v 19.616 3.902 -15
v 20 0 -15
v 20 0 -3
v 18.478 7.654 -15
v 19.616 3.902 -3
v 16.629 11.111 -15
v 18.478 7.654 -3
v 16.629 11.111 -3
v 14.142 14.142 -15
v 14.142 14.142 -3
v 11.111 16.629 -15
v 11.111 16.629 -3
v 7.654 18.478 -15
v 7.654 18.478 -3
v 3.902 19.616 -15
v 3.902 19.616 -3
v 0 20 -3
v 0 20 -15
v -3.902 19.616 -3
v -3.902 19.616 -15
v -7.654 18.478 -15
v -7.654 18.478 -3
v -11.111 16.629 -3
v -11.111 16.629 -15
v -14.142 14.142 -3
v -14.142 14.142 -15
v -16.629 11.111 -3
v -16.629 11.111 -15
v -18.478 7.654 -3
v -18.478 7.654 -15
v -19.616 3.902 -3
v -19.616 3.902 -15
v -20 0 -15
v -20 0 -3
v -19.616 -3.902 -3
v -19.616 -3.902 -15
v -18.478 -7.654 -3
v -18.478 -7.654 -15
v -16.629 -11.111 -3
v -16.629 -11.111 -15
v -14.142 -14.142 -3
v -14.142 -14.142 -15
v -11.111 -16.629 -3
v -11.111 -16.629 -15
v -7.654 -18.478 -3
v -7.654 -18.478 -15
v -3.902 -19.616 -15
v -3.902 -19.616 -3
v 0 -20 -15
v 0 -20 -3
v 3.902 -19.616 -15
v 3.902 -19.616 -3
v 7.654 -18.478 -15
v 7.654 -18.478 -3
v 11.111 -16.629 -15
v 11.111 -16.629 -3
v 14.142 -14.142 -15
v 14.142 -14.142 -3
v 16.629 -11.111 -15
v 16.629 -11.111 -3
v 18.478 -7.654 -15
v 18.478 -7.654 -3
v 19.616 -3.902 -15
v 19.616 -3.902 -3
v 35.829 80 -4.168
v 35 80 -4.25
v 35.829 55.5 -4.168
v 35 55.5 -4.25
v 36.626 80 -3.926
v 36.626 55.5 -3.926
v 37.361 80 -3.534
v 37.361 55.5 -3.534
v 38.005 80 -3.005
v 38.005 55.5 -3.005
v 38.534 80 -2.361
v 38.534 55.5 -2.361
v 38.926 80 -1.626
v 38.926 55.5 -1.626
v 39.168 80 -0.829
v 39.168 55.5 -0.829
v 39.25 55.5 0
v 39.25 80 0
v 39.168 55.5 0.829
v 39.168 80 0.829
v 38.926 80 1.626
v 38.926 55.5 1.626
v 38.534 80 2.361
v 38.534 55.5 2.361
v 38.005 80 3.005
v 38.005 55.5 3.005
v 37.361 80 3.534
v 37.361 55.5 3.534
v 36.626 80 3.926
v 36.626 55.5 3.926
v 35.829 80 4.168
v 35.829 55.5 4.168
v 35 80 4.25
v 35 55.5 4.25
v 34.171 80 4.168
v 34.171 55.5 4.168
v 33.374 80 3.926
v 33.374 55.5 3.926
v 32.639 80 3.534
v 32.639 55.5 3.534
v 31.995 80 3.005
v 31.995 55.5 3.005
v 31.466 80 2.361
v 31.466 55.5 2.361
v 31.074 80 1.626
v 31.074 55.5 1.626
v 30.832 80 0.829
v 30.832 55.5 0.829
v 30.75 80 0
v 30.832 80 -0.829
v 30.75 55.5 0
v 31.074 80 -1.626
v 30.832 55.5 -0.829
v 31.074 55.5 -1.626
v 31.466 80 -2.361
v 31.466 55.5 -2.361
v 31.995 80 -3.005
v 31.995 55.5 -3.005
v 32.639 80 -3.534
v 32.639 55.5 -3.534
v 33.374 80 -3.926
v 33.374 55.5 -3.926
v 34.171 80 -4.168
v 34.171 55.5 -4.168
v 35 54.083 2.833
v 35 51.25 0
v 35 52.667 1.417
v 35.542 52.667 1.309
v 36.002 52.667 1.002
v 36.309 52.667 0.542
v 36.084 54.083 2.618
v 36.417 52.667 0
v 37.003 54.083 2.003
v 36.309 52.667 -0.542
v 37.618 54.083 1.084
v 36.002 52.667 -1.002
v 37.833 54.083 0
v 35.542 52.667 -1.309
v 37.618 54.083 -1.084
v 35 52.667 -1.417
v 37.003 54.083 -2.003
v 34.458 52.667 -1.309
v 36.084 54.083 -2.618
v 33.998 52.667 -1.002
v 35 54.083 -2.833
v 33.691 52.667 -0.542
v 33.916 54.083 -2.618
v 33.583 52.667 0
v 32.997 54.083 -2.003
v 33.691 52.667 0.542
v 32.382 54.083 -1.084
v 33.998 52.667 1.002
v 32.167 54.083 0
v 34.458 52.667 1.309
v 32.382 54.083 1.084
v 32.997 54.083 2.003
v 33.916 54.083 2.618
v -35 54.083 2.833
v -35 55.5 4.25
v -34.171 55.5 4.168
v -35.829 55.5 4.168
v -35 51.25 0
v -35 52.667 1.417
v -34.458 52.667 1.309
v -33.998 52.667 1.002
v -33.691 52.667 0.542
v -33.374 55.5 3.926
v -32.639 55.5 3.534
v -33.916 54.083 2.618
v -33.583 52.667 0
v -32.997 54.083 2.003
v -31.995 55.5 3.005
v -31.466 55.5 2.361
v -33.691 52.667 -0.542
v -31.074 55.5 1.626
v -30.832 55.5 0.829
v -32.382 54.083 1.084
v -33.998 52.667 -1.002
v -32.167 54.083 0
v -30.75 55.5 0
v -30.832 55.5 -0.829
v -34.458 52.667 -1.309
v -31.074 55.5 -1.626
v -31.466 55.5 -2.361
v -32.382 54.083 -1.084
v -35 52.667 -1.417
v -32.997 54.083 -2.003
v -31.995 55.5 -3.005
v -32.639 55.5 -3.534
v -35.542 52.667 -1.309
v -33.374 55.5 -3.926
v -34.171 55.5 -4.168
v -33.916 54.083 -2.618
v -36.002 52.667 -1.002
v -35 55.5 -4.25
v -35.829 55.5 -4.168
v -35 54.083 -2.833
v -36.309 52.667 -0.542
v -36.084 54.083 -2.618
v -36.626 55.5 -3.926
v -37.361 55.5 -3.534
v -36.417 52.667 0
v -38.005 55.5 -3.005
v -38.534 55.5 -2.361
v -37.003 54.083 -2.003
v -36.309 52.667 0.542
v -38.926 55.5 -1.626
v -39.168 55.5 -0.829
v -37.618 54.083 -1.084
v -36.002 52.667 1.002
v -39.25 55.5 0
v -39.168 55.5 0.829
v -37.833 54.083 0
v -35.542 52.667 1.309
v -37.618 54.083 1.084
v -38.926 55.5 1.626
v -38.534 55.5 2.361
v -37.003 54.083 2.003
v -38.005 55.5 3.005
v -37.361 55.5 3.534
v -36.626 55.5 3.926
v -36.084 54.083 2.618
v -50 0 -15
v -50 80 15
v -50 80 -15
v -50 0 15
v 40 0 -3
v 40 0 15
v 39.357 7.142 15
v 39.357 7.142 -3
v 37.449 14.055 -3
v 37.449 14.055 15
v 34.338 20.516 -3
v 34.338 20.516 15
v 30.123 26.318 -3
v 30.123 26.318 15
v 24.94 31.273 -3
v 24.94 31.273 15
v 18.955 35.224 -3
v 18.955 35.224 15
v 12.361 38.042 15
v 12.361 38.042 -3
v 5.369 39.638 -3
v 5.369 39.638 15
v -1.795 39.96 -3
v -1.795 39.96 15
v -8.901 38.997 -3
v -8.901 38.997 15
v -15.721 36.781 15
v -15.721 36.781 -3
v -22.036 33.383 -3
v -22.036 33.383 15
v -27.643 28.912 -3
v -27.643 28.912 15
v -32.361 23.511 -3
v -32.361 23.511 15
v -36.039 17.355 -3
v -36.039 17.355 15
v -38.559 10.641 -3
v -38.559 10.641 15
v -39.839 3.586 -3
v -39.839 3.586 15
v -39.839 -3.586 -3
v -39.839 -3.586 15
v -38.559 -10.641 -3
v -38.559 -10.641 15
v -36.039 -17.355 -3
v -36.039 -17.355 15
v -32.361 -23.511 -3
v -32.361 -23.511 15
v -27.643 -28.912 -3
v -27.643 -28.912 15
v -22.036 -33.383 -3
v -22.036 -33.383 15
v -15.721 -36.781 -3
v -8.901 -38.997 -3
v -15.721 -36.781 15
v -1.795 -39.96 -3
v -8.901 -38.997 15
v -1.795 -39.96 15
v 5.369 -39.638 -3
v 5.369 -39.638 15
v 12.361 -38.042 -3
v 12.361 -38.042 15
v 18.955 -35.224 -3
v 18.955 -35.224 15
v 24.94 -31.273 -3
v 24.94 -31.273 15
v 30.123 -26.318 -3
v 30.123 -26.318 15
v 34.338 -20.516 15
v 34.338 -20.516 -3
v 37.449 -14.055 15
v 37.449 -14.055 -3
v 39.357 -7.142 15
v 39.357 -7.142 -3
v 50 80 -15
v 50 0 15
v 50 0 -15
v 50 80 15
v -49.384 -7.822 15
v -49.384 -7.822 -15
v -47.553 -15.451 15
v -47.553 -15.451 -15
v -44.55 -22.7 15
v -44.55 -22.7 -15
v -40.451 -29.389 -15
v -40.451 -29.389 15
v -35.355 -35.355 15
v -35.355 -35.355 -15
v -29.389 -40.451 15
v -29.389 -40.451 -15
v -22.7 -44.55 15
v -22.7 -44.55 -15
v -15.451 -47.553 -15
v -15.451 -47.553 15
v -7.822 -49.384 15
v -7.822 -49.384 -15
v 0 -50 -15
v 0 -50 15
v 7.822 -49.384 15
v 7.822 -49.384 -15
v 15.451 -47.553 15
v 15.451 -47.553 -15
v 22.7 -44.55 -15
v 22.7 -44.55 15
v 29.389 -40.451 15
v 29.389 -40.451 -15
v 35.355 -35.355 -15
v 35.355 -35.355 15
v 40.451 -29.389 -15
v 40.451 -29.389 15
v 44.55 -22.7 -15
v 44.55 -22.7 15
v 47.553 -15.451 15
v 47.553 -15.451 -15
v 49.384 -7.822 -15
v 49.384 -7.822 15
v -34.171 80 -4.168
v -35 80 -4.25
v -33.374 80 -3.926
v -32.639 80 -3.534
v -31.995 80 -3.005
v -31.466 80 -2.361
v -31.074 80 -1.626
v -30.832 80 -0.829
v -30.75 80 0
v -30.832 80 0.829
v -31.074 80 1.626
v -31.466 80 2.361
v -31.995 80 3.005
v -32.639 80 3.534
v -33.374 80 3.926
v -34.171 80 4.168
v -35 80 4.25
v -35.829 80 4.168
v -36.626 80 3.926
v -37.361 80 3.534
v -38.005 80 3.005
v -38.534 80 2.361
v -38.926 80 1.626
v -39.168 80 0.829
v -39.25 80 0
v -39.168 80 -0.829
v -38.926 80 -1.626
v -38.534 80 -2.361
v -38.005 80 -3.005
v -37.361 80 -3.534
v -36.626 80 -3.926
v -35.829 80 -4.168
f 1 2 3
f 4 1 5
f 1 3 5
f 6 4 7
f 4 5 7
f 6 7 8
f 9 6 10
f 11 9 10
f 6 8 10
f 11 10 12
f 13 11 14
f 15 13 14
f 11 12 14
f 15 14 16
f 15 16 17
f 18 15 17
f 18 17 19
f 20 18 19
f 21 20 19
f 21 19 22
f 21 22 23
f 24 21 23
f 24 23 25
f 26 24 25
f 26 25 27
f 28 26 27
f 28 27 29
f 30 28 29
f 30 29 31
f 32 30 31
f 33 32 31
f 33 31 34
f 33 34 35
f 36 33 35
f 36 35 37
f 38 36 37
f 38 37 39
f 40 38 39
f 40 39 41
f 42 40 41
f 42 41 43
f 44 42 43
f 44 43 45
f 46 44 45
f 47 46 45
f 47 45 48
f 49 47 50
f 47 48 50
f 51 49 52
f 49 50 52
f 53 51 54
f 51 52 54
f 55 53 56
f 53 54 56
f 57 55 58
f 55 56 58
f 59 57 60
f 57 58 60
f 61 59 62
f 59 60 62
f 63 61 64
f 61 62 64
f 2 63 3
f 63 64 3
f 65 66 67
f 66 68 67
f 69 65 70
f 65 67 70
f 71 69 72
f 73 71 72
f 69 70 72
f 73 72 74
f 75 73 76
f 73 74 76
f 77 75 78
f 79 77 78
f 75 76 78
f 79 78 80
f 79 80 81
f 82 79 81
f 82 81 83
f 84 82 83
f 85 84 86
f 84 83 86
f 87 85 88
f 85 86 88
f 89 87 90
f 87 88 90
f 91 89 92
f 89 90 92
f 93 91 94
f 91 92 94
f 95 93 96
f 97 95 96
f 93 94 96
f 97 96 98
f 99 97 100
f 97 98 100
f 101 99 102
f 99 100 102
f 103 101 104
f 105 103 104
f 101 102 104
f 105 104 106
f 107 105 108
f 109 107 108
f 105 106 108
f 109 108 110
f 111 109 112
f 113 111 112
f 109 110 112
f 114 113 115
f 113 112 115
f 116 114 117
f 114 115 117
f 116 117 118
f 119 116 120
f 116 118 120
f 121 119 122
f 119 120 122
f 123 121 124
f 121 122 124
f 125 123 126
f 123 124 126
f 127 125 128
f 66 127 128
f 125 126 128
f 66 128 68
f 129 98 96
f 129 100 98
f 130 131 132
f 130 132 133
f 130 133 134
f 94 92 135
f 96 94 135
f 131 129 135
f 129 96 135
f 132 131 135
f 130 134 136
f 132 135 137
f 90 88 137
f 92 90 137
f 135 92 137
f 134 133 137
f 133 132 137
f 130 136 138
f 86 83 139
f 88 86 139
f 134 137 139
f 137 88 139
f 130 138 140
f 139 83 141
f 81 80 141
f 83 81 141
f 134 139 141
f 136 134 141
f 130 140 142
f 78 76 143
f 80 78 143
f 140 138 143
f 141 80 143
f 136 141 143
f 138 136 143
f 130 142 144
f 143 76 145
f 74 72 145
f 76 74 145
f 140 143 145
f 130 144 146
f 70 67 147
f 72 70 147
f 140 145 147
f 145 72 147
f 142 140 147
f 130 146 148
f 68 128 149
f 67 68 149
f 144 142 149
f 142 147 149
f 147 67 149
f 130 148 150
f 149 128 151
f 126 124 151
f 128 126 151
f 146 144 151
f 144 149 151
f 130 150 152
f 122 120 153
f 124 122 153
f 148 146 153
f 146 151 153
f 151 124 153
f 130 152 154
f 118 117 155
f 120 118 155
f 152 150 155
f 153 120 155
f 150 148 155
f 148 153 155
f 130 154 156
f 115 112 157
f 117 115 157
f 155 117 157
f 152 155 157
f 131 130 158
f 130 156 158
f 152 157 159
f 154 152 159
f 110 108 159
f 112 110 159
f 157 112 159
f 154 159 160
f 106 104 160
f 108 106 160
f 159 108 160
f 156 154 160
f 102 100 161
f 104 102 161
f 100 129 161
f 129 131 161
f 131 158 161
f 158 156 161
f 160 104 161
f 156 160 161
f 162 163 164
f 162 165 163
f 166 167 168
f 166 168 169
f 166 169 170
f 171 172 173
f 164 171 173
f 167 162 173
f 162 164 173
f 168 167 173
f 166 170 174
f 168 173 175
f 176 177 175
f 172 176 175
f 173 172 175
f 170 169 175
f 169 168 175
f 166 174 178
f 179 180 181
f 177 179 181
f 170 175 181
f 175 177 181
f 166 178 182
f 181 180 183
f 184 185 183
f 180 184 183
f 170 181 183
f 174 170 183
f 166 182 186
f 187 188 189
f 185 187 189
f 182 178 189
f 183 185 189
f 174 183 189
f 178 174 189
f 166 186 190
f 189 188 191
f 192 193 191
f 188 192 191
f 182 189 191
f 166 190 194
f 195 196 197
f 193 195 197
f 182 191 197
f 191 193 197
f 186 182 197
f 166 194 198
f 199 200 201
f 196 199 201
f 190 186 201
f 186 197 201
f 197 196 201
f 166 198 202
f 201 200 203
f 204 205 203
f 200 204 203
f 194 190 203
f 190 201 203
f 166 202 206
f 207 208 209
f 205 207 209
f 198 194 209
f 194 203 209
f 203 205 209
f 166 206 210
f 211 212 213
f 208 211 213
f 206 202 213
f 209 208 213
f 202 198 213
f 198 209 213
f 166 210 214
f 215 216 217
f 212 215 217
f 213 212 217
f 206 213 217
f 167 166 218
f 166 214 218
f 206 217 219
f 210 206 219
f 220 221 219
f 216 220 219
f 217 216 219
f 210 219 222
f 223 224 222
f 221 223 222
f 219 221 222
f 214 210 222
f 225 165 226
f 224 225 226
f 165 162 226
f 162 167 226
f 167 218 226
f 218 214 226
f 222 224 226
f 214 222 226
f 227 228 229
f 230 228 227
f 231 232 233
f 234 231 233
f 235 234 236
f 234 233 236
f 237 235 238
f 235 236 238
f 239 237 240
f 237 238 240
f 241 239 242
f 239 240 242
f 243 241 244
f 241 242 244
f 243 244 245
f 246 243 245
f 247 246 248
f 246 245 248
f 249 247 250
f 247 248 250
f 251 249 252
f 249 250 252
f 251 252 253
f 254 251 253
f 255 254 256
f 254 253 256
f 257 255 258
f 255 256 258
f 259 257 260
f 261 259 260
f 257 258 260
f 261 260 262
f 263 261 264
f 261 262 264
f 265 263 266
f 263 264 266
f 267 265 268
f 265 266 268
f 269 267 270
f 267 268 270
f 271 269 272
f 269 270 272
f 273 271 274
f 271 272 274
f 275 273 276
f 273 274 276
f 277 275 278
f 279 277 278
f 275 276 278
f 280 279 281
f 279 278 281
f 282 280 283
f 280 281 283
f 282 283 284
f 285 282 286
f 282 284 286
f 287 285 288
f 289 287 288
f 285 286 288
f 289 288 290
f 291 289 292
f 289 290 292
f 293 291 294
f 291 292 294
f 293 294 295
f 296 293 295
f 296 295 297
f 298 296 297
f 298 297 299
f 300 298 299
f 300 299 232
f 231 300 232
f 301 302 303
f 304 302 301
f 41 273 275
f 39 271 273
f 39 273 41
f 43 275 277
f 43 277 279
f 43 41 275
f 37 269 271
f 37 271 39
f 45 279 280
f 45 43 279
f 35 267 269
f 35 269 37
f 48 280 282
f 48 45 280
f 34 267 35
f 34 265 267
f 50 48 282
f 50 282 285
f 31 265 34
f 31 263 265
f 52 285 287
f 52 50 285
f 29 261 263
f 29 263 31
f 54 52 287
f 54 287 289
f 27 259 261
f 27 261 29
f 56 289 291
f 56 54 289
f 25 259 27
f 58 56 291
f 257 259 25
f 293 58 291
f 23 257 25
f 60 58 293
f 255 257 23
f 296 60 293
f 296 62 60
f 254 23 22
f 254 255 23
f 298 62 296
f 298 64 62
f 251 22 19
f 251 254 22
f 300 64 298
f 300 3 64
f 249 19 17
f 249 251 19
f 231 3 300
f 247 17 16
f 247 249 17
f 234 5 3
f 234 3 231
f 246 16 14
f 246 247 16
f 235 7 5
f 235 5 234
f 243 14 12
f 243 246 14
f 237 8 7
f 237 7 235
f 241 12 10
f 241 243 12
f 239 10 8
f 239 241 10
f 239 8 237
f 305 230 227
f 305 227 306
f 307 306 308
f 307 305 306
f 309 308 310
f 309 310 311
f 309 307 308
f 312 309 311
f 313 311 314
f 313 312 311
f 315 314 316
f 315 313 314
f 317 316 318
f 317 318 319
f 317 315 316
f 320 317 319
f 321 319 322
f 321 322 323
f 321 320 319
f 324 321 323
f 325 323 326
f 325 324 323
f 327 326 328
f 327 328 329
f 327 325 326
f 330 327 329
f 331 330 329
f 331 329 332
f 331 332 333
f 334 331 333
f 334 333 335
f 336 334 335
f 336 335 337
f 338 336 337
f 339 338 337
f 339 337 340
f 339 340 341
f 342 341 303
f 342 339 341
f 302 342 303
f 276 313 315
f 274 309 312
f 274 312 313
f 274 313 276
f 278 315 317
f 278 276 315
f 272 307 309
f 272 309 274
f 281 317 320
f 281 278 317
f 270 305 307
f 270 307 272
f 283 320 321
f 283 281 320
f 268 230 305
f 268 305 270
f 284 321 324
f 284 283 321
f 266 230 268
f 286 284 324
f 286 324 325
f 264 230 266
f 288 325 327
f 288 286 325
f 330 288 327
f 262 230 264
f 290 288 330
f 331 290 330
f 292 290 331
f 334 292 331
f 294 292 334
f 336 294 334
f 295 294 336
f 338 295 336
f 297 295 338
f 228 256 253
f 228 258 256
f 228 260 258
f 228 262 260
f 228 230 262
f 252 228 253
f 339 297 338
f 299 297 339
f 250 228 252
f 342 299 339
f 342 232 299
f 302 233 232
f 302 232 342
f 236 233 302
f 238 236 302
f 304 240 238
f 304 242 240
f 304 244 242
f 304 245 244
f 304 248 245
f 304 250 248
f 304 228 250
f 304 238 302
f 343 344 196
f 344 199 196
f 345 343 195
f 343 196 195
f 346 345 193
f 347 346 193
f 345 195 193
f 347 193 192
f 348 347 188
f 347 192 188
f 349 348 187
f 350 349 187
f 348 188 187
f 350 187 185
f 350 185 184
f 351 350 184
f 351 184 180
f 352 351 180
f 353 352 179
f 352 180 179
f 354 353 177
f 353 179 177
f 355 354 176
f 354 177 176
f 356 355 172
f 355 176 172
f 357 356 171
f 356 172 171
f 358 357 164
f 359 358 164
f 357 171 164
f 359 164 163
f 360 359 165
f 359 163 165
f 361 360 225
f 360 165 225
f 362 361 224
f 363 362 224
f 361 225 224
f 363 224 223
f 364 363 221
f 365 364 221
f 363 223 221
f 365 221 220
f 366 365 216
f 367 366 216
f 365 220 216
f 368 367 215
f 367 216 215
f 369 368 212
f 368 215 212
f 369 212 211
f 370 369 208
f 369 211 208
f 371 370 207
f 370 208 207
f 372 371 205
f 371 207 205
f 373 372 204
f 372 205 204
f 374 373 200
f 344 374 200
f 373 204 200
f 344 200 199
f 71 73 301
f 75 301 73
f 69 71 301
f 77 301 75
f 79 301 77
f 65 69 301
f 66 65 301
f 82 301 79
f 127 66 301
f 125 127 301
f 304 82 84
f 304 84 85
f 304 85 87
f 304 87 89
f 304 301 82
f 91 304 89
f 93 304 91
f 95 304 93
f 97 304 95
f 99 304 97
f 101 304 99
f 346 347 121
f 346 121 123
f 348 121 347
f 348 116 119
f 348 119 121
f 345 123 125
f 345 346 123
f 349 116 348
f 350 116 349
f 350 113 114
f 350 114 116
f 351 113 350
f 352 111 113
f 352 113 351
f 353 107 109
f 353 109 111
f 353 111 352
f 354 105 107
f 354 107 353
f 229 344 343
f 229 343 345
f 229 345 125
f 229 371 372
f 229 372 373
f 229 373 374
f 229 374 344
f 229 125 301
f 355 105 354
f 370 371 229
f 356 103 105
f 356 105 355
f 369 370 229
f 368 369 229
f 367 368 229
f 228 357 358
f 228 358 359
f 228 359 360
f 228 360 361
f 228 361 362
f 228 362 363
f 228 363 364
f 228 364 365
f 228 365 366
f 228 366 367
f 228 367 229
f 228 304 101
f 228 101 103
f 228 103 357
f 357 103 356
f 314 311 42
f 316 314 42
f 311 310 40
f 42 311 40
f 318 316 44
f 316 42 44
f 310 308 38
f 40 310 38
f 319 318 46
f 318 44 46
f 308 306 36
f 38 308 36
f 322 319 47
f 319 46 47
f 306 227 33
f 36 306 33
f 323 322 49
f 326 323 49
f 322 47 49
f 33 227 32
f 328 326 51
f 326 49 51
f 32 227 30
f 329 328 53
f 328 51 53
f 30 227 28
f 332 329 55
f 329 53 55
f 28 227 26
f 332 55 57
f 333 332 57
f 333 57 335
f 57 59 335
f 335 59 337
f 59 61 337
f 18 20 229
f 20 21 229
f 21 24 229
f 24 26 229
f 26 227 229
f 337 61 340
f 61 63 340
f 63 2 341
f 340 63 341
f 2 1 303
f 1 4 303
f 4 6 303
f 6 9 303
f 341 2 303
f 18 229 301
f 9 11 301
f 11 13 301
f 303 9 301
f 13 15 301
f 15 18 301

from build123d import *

# Parameters (mm, degrees)
BOSS_EXTRUDE1_DEPTH    = 15
SKETCH3_R              = 20
CUT_EXTRUDE1_DEPTH     = 99.994949366
SKETCH4_R              = 40
CUT_EXTRUDE2_DEPTH     = 18
M10_TAPPED_HOLE1_D     = 8.5
M10_TAPPED_HOLE1_DEPTH = 24.5
M10_TAPPED_HOLE1_TIP   = 4.25


with BuildPart() as part:
    # Sketch1 → Boss-Extrude1 (new, symmetric)
    with BuildSketch(Plane.XY):
        with BuildLine():
            Line((-50, 80), (-50, 0))
            ThreePointArc((-50, 0), (0, -50), (50, 0))
            Line((50, 0), (50, 80))
            Line((50, 80), (-50, 80))
        make_face()
    extrude(amount=BOSS_EXTRUDE1_DEPTH, both=True)

    # Sketch3 → Cut-Extrude1 (cut, through all)
    with BuildSketch(Plane.XY.offset(15)):
        Circle(SKETCH3_R)
    extrude(amount=-CUT_EXTRUDE1_DEPTH, mode=Mode.SUBTRACT)

    # Sketch4 → Cut-Extrude2 (cut)
    with BuildSketch(Plane.XY.offset(15)):
        Circle(SKETCH4_R)
    extrude(amount=-CUT_EXTRUDE2_DEPTH, mode=Mode.SUBTRACT)

    # M10 Tapped Hole1
    with Locations(Plane(origin=(-35, 80, 0), x_dir=(0, 0, 1), z_dir=(0, 1, 0))):
        with Locations((0, 0), (0, 70)):
            Hole(M10_TAPPED_HOLE1_D / 2, depth=M10_TAPPED_HOLE1_DEPTH)
            with Locations((0, 0, -(M10_TAPPED_HOLE1_DEPTH + M10_TAPPED_HOLE1_TIP / 2))):  # 90° drill point
                Cone(0, M10_TAPPED_HOLE1_D / 2, M10_TAPPED_HOLE1_TIP, mode=Mode.SUBTRACT)


solid = part.part
